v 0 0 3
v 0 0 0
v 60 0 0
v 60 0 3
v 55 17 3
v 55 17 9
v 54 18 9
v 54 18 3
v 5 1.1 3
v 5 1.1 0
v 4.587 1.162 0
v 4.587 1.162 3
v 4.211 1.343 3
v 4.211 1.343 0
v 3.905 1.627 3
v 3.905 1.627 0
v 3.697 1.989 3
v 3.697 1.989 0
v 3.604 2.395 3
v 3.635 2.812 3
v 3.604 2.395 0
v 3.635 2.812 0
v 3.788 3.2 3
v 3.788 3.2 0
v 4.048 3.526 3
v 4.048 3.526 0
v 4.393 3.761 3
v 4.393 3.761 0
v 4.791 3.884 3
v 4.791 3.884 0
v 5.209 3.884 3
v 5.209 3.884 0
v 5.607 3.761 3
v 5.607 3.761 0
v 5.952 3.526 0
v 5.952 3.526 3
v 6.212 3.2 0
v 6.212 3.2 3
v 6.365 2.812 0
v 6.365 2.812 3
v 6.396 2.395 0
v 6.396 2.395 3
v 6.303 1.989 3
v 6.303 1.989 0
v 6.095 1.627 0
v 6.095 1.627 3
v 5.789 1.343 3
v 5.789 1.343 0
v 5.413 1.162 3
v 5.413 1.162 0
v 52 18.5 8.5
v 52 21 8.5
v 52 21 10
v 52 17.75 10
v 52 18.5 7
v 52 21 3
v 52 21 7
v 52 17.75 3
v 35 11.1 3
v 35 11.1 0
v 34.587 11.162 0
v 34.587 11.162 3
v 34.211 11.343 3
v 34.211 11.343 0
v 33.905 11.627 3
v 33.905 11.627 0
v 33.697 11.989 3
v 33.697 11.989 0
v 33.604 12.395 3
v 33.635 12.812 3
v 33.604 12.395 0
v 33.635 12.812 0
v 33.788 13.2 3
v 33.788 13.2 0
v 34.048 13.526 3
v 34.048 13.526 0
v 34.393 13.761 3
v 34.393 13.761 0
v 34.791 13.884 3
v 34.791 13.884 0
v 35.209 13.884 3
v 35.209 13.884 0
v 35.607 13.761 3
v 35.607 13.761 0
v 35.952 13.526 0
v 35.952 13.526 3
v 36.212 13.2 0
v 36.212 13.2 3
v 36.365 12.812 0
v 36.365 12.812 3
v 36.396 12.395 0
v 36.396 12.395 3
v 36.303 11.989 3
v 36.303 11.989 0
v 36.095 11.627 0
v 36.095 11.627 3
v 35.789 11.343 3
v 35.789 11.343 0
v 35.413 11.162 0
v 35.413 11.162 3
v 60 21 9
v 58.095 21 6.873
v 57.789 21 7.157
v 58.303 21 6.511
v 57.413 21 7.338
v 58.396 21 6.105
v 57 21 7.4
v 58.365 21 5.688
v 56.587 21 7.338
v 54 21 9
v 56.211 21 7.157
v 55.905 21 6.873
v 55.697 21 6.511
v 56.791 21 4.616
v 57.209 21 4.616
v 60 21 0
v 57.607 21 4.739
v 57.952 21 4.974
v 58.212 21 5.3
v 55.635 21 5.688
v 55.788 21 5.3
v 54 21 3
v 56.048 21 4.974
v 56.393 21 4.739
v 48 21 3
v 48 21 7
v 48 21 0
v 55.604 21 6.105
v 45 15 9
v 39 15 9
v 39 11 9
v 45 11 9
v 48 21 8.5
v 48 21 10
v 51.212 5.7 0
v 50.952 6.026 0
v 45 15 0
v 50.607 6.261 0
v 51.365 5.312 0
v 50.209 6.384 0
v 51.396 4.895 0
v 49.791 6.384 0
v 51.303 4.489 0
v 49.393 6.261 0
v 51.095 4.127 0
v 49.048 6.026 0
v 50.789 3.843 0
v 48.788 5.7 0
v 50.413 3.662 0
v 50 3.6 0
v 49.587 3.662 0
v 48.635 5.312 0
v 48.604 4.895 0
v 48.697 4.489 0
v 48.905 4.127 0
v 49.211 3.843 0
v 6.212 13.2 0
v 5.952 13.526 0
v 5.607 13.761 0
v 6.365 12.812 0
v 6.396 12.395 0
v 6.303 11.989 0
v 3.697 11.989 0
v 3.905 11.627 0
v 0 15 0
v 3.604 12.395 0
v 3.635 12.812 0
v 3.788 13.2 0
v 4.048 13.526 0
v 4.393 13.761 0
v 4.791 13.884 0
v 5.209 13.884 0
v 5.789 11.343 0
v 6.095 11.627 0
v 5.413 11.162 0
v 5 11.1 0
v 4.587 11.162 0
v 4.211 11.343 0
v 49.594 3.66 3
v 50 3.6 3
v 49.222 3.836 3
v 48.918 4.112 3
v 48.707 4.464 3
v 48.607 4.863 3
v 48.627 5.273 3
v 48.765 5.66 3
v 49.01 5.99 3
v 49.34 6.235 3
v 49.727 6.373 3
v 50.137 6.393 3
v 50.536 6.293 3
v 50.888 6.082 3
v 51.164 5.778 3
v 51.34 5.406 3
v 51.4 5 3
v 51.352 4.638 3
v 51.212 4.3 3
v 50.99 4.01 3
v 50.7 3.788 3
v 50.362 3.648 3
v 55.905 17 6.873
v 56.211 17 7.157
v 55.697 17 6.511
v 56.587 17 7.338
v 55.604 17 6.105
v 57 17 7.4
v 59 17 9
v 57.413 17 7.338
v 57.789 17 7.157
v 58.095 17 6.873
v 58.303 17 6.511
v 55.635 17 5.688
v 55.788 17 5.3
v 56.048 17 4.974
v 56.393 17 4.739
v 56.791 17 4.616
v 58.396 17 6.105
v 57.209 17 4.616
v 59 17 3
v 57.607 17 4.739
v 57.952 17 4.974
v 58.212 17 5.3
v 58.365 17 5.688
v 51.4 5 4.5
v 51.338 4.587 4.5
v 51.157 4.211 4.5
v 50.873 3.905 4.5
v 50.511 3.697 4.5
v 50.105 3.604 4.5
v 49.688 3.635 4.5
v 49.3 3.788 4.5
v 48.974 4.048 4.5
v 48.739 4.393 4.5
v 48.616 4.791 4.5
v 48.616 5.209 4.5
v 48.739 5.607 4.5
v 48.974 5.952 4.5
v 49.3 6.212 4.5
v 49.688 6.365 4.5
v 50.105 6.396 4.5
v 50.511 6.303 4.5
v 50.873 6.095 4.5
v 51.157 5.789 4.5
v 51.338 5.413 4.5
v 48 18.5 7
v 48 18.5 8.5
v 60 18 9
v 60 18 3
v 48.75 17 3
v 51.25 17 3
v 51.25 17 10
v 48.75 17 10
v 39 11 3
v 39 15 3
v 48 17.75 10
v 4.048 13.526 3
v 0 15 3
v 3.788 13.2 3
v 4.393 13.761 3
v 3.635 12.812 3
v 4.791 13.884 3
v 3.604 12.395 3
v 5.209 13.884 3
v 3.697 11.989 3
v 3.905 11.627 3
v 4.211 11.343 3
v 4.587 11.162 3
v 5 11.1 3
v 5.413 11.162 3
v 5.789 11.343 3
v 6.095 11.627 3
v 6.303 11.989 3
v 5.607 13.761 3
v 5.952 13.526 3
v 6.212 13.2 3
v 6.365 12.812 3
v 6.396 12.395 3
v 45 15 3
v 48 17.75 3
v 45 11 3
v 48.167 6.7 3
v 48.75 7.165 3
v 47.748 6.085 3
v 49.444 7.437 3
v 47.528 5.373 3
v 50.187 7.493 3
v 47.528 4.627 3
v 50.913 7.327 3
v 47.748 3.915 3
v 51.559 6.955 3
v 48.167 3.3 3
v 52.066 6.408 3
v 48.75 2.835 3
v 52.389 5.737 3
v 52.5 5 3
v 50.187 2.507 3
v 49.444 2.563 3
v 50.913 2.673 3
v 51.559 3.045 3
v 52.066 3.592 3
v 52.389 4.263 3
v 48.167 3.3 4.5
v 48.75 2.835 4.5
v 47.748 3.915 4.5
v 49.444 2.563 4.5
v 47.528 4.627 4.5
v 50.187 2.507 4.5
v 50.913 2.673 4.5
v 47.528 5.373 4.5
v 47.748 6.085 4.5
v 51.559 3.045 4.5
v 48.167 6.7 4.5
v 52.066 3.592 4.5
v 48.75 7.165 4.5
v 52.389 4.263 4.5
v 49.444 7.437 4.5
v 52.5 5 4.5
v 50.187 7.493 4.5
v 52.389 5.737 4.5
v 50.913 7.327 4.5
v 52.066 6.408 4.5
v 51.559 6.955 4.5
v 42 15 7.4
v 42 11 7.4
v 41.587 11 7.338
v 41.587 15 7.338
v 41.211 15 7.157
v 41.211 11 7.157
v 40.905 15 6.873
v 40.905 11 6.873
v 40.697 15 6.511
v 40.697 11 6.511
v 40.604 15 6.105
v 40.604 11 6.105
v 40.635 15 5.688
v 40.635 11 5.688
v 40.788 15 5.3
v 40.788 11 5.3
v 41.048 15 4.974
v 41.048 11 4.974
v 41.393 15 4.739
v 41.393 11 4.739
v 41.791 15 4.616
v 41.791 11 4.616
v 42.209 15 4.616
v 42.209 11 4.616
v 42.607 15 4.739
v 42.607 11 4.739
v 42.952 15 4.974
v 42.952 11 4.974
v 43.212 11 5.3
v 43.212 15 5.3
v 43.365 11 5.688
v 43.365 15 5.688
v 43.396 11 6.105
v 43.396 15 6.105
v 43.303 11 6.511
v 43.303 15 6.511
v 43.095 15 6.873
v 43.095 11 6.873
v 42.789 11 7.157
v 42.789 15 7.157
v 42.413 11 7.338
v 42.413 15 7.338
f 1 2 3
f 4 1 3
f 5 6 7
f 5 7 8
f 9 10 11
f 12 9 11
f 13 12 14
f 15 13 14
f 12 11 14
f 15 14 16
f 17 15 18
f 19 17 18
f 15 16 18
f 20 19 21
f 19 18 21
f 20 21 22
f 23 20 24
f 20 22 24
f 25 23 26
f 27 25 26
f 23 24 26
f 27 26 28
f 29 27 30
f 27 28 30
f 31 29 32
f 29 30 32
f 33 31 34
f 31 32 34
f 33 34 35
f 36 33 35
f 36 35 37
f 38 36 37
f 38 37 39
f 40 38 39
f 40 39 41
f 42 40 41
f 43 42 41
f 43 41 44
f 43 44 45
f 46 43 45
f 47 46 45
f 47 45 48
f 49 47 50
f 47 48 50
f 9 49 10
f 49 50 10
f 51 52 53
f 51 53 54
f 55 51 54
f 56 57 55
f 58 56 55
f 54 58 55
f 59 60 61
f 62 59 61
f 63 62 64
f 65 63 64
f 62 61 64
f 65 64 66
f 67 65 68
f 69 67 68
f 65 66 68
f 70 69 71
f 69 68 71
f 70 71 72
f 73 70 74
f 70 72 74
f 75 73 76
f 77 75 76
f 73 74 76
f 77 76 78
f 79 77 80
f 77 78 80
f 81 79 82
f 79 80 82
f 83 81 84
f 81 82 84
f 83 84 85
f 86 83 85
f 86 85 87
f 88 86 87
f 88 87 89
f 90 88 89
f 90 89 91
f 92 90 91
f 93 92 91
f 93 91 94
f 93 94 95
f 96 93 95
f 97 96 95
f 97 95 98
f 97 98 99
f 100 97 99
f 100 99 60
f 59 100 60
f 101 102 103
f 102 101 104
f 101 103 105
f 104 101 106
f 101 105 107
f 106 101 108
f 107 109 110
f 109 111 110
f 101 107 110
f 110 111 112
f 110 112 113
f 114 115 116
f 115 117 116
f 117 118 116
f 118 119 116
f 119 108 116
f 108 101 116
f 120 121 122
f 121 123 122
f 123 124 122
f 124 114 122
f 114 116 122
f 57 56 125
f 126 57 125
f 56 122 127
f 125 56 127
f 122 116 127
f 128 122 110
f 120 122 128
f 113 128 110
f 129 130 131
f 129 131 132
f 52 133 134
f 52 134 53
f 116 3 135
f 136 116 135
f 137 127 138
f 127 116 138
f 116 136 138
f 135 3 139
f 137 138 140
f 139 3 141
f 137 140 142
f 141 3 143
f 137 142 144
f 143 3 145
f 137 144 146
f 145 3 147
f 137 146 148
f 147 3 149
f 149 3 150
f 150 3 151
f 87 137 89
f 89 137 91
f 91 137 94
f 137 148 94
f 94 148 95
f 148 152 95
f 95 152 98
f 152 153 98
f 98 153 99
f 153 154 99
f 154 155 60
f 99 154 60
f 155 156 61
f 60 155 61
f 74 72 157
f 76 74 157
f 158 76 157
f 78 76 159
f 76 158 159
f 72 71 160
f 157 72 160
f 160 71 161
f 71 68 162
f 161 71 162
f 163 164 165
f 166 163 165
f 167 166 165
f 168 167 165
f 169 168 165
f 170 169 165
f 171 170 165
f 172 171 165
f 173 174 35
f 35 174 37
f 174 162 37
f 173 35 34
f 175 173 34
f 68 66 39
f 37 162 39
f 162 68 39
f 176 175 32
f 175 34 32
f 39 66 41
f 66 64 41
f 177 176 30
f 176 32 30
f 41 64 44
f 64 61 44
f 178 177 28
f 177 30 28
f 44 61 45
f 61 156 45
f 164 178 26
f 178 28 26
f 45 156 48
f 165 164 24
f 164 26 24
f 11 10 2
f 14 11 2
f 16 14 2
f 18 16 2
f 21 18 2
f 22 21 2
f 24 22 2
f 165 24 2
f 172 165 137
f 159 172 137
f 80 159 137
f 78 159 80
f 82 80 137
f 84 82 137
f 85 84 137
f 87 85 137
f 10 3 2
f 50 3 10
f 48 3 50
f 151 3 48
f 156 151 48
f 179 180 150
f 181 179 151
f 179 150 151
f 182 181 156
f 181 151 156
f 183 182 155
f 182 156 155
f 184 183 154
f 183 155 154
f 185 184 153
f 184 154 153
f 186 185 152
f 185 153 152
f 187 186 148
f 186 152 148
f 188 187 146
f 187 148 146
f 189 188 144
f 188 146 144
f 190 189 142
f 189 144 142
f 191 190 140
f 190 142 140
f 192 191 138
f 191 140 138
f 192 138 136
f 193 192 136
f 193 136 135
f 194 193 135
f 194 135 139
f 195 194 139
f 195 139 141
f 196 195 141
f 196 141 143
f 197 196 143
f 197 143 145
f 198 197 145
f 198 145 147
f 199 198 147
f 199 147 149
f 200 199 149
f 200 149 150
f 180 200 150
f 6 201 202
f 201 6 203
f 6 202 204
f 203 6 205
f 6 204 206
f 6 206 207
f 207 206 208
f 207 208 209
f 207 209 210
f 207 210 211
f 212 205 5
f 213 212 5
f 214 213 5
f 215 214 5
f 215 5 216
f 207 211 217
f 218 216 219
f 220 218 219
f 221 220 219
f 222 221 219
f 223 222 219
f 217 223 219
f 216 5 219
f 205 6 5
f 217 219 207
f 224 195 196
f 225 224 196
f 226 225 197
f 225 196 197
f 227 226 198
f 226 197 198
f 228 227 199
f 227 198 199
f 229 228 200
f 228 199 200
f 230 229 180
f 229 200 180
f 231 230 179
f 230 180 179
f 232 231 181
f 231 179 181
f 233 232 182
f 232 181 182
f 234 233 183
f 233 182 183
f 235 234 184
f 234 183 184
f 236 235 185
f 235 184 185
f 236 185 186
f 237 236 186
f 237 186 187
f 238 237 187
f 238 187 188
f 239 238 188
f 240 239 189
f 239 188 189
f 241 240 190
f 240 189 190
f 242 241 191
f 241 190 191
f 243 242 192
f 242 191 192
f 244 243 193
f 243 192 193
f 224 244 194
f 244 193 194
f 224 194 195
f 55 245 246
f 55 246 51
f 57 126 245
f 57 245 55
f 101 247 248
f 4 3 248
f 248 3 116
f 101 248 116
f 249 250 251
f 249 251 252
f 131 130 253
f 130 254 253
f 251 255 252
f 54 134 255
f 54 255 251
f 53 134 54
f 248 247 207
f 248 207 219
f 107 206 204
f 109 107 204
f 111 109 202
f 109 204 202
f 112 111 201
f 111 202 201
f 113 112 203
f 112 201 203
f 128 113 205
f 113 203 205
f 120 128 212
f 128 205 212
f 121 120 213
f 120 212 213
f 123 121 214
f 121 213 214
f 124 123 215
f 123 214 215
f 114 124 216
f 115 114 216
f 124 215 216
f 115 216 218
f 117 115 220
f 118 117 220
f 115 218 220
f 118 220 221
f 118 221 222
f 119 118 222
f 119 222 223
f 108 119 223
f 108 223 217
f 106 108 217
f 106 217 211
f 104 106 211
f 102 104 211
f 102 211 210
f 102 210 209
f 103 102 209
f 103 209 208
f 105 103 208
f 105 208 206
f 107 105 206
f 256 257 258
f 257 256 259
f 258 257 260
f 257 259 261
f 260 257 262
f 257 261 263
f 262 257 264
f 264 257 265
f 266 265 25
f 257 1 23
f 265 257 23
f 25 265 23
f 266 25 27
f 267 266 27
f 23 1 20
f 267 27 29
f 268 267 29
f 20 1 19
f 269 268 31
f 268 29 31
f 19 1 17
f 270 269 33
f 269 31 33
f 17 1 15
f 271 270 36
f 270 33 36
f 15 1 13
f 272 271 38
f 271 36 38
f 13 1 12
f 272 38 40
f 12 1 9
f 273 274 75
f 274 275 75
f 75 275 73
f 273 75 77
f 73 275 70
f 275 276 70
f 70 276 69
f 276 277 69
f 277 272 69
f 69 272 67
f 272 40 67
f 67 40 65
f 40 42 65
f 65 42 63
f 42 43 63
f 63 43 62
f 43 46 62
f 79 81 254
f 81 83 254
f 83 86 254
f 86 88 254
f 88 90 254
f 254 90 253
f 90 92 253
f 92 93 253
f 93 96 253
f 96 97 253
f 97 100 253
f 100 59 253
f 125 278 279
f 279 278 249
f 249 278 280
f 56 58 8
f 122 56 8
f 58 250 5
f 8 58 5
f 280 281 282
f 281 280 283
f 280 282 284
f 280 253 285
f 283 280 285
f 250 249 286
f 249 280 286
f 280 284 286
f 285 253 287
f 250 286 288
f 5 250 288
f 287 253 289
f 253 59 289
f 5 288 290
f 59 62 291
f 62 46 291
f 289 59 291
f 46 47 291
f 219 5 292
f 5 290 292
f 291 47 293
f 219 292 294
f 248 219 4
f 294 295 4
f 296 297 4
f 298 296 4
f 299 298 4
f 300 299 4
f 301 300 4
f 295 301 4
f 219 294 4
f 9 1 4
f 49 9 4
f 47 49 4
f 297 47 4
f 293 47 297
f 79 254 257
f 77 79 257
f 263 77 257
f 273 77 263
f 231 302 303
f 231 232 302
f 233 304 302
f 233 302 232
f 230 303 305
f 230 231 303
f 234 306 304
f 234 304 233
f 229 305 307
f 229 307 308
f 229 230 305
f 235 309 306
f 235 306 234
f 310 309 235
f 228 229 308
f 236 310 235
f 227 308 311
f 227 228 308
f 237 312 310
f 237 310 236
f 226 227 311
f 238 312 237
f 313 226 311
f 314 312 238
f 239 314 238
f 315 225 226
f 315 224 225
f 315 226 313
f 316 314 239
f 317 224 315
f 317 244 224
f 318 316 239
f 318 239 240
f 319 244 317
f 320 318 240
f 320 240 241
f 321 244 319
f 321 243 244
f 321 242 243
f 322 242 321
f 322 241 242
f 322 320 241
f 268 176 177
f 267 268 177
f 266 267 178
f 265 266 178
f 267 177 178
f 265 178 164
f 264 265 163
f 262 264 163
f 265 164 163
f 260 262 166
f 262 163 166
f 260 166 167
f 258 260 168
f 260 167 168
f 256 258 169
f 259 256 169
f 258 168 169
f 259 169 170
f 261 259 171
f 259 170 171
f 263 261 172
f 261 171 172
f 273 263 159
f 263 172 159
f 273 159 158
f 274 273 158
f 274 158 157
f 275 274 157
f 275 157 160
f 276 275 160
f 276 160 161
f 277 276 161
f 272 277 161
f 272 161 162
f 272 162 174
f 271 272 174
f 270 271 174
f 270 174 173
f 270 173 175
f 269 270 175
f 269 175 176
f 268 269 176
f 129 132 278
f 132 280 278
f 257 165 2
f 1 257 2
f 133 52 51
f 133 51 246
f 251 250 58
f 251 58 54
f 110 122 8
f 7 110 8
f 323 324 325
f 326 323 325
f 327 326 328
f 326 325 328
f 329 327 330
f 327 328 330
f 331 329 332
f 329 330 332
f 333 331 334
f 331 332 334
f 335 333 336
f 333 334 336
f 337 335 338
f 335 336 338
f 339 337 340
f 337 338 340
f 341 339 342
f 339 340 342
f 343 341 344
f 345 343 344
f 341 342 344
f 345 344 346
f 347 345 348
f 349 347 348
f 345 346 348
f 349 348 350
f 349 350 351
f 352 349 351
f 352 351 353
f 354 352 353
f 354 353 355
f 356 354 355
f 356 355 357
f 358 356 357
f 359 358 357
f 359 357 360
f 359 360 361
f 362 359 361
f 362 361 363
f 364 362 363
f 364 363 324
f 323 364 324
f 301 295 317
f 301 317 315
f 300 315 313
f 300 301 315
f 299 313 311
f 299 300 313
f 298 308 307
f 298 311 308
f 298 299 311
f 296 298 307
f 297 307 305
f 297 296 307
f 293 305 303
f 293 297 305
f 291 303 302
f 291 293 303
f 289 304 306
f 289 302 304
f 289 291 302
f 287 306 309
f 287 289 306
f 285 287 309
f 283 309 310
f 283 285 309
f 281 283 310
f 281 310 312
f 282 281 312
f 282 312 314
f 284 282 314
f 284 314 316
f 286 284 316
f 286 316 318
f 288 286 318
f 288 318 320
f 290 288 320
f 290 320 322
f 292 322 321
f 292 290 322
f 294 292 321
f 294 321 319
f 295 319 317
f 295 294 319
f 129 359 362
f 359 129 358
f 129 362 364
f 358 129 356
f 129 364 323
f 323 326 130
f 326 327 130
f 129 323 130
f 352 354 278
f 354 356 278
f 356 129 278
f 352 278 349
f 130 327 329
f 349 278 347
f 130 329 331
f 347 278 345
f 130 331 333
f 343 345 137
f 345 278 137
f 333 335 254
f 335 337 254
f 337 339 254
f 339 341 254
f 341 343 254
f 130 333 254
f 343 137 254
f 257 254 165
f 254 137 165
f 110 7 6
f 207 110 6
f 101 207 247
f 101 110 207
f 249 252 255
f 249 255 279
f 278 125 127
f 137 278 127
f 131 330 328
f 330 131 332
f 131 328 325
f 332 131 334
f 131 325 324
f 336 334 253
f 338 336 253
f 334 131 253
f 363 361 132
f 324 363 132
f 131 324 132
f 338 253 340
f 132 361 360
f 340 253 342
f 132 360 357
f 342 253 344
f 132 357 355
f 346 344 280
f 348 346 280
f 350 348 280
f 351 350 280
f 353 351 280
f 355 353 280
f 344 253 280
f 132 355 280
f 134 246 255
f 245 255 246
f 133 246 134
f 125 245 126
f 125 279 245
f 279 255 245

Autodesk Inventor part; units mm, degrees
ref_plane "YZ Plane" through (0, 0, 0) normal (1, 0, 0) x (0, 1, 0)
ref_plane "XZ Plane" through (0, 0, 0) normal (0, 1, 0) x (-1, 0, 0)
ref_plane "XY Plane" through (0, 0, 0) normal (0, 0, 1) x (1, 0, 0)
sketch "Sketch1" plane through (0, 0, 0) normal (0, 0, 1) x (1, 0, 0)
  line L0 (0, 0) -> (60, 0)
  line L1 (60, 0) -> (60, 15)
  line L2 (60, 15) -> (0, 15)
  line L3 (0, 15) -> (0, 0)
  dimension "d0" = 60
  dimension "d1" = 15
extrude "Extrusion1" add sketch "Sketch1" along normal blind 3
sketch "Sketch2" plane through (0, 0, 3) normal (0, 0, 1) x (1, 0, 0)
  line L0 (0, 15) -> (0, 0) projected
  line L1 (0, 0) -> (60, 0) projected
  point P0 (50, 5)
  dimension "d4" = 50
  dimension "d5" = 5
hole "Hole1" at (50, 5, 3) direction (0, 0, -1) diameter 2.8 depth 10
sketch "Sketch3" plane through (0, 0, 3) normal (0, 0, 1) x (1, 0, 0)
  point P0 (0, 0)
sketch "Sketch4" plane through (0, 0, 3) normal (0, 0, 1) x (1, 0, 0)
  circle A0 centre (50, 5) radius 2.5
  circle A1 centre (50, 5) radius 1.4 projected
  circle A2 centre (50, 5) radius 1.4
  point P0 (0, 0)
  dimension "d13" = 5
extrude "Extrusion2" add sketch "Sketch4" along normal blind 1.5
sketch "Sketch5" plane through (0, 15, 0) normal (0, 1, 0) x (1, 0, 0)
  line L0 (0, -3) -> (60, -3) projected
  line L1 (60, 0) -> (45, 0)
  line L2 (45, 0) -> (45, -3)
  line L3 (45, -3) -> (60, -3)
  line L4 (60, -3) -> (60, 0)
  point P0 (0, 0)
  dimension "d16" = 15
extrude "Extrusion3" add sketch "Sketch5" along normal blind 6
sketch "Sketch6" plane through (0, 0, 3) normal (0, 0, 1) x (1, 0, 0)
  line L0 (60, 21) -> (45, 21) projected
  line L1 (48, 21) -> (52, 21)
  line L2 (52, 21) -> (52, 17)
  line L3 (52, 17) -> (48, 17)
  line L4 (48, 17) -> (48, 21)
  line L5 (60, 0) -> (60, 21) projected
  point P0 (0, 0)
  dimension "d19" = 4
  dimension "d20" = 4
  dimension "d21" = 8
extrude "Extrusion4" add sketch "Sketch6" along normal blind 7
sketch "Sketch7" plane through (0, 21, 0) normal (0, 1, 0) x (1, 0, 0)
  line L0 (48, -3) -> (48, -10) projected
  line L1 (52, -3) -> (52, -10) projected
  line L2 (48, -7) -> (52, -7)
  line L3 (52, -7) -> (52, -8.5)
  line L4 (52, -8.5) -> (48, -8.5)
  line L5 (48, -8.5) -> (48, -7)
  line L6 (52, -10) -> (48, -10) projected
  point P0 (0, 0)
  point P1 (50, -8.5)
  dimension "d24" = 1.5
  dimension "d25" = 1.5
extrude "Extrusion5" cut sketch "Sketch7" against normal blind 2.5 contours L2 L1 L4 L0
sketch "Sketch8" plane through (0, 0, 3) normal (0, 0, 1) x (1, 0, 0)
  line L0 (60, 21) -> (45, 21) projected
  line L1 (60, 21) -> (54, 21)
  line L2 (54, 21) -> (54, 17)
  line L3 (54, 17) -> (60, 17)
  line L4 (60, 17) -> (60, 21)
  point P0 (0, 0)
  dimension "d28" = 6
  dimension "d29" = 4
extrude "Extrusion6" add sketch "Sketch8" along normal blind 6
sketch "Sketch9" plane through (0, 21, 0) normal (0, 1, 0) x (1, 0, 0)
  line L0 (60, 0) -> (60, -9) projected
  line L1 (60, -9) -> (54, -9) projected
  point P0 (0, 0)
  point P1 (57, -6)
  dimension "d32" = 3
  dimension "d33" = 3
hole "Hole2" at (57, 21, 6) direction (0, -1, 0) diameter 2.8 depth 5
chamfer "Chamfer1" distance 0.75 angle 45 2 edges at (52, 17, 6.5) (48, 17, 6.5)
chamfer "Chamfer2" distance 1 angle 45 2 edges at (60, 17, 6) (54, 17, 6)
chamfer "Chamfer3" distance 3 distance2 6 1 edges at (45, 21, 1.5) measured on face at (53, 21, 1)
sketch "Sketch10" plane through (0, 0, 3) normal (0, 0, 1) x (1, 0, 0)
  line L0 (45, 15) -> (0, 15) projected
  line L1 (45, 15) -> (39, 15)
  line L2 (39, 15) -> (39, 11)
  line L3 (39, 11) -> (45, 11)
  line L4 (45, 11) -> (45, 15)
  point P0 (0, 0)
  dimension "d50" = 6
  dimension "d51" = 4
extrude "Extrusion7" add sketch "Sketch10" along normal blind 6
sketch "Sketch11" plane through (0, 15, 3) normal (0, 1, 0) x (1, 0, 0)
  line L0 (45, -6) -> (39, -6) projected
  line L1 (39, 0) -> (39, -6) projected
  point P0 (0, 3)
  point P1 (42, -3)
  dimension "d54" = 3
  dimension "d55" = 3
hole "Hole3" at (42, 15, 6) direction (0, -1, 0) diameter 2.8 depth 5
sketch "Sketch12" plane through (0, 0, 3) normal (0, 0, 1) x (1, 0, 0)
  line L0 (35, 12.5) -> (5, 12.5)
  line L1 (5, 12.5) -> (5, 2.5)
  line L2 (12.2868, 12.5) -> (12.2868, 15)
  line L3 (45, 15) -> (0, 15) projected
  line L4 (11.9839, 2.5) -> (11.9839, 0)
  line L5 (0, 0) -> (60, 0) projected
  line L6 (0, 15) -> (0, 0) projected
  dimension "d64" = 10
  dimension "d65" = 5
hole "Hole4" at (35, 12.5, 3) at (5, 12.5, 3) at (5, 2.5, 3) direction (0, 0, -1) diameter 2.8 depth 3
properties part number "probe mount 1 side"
